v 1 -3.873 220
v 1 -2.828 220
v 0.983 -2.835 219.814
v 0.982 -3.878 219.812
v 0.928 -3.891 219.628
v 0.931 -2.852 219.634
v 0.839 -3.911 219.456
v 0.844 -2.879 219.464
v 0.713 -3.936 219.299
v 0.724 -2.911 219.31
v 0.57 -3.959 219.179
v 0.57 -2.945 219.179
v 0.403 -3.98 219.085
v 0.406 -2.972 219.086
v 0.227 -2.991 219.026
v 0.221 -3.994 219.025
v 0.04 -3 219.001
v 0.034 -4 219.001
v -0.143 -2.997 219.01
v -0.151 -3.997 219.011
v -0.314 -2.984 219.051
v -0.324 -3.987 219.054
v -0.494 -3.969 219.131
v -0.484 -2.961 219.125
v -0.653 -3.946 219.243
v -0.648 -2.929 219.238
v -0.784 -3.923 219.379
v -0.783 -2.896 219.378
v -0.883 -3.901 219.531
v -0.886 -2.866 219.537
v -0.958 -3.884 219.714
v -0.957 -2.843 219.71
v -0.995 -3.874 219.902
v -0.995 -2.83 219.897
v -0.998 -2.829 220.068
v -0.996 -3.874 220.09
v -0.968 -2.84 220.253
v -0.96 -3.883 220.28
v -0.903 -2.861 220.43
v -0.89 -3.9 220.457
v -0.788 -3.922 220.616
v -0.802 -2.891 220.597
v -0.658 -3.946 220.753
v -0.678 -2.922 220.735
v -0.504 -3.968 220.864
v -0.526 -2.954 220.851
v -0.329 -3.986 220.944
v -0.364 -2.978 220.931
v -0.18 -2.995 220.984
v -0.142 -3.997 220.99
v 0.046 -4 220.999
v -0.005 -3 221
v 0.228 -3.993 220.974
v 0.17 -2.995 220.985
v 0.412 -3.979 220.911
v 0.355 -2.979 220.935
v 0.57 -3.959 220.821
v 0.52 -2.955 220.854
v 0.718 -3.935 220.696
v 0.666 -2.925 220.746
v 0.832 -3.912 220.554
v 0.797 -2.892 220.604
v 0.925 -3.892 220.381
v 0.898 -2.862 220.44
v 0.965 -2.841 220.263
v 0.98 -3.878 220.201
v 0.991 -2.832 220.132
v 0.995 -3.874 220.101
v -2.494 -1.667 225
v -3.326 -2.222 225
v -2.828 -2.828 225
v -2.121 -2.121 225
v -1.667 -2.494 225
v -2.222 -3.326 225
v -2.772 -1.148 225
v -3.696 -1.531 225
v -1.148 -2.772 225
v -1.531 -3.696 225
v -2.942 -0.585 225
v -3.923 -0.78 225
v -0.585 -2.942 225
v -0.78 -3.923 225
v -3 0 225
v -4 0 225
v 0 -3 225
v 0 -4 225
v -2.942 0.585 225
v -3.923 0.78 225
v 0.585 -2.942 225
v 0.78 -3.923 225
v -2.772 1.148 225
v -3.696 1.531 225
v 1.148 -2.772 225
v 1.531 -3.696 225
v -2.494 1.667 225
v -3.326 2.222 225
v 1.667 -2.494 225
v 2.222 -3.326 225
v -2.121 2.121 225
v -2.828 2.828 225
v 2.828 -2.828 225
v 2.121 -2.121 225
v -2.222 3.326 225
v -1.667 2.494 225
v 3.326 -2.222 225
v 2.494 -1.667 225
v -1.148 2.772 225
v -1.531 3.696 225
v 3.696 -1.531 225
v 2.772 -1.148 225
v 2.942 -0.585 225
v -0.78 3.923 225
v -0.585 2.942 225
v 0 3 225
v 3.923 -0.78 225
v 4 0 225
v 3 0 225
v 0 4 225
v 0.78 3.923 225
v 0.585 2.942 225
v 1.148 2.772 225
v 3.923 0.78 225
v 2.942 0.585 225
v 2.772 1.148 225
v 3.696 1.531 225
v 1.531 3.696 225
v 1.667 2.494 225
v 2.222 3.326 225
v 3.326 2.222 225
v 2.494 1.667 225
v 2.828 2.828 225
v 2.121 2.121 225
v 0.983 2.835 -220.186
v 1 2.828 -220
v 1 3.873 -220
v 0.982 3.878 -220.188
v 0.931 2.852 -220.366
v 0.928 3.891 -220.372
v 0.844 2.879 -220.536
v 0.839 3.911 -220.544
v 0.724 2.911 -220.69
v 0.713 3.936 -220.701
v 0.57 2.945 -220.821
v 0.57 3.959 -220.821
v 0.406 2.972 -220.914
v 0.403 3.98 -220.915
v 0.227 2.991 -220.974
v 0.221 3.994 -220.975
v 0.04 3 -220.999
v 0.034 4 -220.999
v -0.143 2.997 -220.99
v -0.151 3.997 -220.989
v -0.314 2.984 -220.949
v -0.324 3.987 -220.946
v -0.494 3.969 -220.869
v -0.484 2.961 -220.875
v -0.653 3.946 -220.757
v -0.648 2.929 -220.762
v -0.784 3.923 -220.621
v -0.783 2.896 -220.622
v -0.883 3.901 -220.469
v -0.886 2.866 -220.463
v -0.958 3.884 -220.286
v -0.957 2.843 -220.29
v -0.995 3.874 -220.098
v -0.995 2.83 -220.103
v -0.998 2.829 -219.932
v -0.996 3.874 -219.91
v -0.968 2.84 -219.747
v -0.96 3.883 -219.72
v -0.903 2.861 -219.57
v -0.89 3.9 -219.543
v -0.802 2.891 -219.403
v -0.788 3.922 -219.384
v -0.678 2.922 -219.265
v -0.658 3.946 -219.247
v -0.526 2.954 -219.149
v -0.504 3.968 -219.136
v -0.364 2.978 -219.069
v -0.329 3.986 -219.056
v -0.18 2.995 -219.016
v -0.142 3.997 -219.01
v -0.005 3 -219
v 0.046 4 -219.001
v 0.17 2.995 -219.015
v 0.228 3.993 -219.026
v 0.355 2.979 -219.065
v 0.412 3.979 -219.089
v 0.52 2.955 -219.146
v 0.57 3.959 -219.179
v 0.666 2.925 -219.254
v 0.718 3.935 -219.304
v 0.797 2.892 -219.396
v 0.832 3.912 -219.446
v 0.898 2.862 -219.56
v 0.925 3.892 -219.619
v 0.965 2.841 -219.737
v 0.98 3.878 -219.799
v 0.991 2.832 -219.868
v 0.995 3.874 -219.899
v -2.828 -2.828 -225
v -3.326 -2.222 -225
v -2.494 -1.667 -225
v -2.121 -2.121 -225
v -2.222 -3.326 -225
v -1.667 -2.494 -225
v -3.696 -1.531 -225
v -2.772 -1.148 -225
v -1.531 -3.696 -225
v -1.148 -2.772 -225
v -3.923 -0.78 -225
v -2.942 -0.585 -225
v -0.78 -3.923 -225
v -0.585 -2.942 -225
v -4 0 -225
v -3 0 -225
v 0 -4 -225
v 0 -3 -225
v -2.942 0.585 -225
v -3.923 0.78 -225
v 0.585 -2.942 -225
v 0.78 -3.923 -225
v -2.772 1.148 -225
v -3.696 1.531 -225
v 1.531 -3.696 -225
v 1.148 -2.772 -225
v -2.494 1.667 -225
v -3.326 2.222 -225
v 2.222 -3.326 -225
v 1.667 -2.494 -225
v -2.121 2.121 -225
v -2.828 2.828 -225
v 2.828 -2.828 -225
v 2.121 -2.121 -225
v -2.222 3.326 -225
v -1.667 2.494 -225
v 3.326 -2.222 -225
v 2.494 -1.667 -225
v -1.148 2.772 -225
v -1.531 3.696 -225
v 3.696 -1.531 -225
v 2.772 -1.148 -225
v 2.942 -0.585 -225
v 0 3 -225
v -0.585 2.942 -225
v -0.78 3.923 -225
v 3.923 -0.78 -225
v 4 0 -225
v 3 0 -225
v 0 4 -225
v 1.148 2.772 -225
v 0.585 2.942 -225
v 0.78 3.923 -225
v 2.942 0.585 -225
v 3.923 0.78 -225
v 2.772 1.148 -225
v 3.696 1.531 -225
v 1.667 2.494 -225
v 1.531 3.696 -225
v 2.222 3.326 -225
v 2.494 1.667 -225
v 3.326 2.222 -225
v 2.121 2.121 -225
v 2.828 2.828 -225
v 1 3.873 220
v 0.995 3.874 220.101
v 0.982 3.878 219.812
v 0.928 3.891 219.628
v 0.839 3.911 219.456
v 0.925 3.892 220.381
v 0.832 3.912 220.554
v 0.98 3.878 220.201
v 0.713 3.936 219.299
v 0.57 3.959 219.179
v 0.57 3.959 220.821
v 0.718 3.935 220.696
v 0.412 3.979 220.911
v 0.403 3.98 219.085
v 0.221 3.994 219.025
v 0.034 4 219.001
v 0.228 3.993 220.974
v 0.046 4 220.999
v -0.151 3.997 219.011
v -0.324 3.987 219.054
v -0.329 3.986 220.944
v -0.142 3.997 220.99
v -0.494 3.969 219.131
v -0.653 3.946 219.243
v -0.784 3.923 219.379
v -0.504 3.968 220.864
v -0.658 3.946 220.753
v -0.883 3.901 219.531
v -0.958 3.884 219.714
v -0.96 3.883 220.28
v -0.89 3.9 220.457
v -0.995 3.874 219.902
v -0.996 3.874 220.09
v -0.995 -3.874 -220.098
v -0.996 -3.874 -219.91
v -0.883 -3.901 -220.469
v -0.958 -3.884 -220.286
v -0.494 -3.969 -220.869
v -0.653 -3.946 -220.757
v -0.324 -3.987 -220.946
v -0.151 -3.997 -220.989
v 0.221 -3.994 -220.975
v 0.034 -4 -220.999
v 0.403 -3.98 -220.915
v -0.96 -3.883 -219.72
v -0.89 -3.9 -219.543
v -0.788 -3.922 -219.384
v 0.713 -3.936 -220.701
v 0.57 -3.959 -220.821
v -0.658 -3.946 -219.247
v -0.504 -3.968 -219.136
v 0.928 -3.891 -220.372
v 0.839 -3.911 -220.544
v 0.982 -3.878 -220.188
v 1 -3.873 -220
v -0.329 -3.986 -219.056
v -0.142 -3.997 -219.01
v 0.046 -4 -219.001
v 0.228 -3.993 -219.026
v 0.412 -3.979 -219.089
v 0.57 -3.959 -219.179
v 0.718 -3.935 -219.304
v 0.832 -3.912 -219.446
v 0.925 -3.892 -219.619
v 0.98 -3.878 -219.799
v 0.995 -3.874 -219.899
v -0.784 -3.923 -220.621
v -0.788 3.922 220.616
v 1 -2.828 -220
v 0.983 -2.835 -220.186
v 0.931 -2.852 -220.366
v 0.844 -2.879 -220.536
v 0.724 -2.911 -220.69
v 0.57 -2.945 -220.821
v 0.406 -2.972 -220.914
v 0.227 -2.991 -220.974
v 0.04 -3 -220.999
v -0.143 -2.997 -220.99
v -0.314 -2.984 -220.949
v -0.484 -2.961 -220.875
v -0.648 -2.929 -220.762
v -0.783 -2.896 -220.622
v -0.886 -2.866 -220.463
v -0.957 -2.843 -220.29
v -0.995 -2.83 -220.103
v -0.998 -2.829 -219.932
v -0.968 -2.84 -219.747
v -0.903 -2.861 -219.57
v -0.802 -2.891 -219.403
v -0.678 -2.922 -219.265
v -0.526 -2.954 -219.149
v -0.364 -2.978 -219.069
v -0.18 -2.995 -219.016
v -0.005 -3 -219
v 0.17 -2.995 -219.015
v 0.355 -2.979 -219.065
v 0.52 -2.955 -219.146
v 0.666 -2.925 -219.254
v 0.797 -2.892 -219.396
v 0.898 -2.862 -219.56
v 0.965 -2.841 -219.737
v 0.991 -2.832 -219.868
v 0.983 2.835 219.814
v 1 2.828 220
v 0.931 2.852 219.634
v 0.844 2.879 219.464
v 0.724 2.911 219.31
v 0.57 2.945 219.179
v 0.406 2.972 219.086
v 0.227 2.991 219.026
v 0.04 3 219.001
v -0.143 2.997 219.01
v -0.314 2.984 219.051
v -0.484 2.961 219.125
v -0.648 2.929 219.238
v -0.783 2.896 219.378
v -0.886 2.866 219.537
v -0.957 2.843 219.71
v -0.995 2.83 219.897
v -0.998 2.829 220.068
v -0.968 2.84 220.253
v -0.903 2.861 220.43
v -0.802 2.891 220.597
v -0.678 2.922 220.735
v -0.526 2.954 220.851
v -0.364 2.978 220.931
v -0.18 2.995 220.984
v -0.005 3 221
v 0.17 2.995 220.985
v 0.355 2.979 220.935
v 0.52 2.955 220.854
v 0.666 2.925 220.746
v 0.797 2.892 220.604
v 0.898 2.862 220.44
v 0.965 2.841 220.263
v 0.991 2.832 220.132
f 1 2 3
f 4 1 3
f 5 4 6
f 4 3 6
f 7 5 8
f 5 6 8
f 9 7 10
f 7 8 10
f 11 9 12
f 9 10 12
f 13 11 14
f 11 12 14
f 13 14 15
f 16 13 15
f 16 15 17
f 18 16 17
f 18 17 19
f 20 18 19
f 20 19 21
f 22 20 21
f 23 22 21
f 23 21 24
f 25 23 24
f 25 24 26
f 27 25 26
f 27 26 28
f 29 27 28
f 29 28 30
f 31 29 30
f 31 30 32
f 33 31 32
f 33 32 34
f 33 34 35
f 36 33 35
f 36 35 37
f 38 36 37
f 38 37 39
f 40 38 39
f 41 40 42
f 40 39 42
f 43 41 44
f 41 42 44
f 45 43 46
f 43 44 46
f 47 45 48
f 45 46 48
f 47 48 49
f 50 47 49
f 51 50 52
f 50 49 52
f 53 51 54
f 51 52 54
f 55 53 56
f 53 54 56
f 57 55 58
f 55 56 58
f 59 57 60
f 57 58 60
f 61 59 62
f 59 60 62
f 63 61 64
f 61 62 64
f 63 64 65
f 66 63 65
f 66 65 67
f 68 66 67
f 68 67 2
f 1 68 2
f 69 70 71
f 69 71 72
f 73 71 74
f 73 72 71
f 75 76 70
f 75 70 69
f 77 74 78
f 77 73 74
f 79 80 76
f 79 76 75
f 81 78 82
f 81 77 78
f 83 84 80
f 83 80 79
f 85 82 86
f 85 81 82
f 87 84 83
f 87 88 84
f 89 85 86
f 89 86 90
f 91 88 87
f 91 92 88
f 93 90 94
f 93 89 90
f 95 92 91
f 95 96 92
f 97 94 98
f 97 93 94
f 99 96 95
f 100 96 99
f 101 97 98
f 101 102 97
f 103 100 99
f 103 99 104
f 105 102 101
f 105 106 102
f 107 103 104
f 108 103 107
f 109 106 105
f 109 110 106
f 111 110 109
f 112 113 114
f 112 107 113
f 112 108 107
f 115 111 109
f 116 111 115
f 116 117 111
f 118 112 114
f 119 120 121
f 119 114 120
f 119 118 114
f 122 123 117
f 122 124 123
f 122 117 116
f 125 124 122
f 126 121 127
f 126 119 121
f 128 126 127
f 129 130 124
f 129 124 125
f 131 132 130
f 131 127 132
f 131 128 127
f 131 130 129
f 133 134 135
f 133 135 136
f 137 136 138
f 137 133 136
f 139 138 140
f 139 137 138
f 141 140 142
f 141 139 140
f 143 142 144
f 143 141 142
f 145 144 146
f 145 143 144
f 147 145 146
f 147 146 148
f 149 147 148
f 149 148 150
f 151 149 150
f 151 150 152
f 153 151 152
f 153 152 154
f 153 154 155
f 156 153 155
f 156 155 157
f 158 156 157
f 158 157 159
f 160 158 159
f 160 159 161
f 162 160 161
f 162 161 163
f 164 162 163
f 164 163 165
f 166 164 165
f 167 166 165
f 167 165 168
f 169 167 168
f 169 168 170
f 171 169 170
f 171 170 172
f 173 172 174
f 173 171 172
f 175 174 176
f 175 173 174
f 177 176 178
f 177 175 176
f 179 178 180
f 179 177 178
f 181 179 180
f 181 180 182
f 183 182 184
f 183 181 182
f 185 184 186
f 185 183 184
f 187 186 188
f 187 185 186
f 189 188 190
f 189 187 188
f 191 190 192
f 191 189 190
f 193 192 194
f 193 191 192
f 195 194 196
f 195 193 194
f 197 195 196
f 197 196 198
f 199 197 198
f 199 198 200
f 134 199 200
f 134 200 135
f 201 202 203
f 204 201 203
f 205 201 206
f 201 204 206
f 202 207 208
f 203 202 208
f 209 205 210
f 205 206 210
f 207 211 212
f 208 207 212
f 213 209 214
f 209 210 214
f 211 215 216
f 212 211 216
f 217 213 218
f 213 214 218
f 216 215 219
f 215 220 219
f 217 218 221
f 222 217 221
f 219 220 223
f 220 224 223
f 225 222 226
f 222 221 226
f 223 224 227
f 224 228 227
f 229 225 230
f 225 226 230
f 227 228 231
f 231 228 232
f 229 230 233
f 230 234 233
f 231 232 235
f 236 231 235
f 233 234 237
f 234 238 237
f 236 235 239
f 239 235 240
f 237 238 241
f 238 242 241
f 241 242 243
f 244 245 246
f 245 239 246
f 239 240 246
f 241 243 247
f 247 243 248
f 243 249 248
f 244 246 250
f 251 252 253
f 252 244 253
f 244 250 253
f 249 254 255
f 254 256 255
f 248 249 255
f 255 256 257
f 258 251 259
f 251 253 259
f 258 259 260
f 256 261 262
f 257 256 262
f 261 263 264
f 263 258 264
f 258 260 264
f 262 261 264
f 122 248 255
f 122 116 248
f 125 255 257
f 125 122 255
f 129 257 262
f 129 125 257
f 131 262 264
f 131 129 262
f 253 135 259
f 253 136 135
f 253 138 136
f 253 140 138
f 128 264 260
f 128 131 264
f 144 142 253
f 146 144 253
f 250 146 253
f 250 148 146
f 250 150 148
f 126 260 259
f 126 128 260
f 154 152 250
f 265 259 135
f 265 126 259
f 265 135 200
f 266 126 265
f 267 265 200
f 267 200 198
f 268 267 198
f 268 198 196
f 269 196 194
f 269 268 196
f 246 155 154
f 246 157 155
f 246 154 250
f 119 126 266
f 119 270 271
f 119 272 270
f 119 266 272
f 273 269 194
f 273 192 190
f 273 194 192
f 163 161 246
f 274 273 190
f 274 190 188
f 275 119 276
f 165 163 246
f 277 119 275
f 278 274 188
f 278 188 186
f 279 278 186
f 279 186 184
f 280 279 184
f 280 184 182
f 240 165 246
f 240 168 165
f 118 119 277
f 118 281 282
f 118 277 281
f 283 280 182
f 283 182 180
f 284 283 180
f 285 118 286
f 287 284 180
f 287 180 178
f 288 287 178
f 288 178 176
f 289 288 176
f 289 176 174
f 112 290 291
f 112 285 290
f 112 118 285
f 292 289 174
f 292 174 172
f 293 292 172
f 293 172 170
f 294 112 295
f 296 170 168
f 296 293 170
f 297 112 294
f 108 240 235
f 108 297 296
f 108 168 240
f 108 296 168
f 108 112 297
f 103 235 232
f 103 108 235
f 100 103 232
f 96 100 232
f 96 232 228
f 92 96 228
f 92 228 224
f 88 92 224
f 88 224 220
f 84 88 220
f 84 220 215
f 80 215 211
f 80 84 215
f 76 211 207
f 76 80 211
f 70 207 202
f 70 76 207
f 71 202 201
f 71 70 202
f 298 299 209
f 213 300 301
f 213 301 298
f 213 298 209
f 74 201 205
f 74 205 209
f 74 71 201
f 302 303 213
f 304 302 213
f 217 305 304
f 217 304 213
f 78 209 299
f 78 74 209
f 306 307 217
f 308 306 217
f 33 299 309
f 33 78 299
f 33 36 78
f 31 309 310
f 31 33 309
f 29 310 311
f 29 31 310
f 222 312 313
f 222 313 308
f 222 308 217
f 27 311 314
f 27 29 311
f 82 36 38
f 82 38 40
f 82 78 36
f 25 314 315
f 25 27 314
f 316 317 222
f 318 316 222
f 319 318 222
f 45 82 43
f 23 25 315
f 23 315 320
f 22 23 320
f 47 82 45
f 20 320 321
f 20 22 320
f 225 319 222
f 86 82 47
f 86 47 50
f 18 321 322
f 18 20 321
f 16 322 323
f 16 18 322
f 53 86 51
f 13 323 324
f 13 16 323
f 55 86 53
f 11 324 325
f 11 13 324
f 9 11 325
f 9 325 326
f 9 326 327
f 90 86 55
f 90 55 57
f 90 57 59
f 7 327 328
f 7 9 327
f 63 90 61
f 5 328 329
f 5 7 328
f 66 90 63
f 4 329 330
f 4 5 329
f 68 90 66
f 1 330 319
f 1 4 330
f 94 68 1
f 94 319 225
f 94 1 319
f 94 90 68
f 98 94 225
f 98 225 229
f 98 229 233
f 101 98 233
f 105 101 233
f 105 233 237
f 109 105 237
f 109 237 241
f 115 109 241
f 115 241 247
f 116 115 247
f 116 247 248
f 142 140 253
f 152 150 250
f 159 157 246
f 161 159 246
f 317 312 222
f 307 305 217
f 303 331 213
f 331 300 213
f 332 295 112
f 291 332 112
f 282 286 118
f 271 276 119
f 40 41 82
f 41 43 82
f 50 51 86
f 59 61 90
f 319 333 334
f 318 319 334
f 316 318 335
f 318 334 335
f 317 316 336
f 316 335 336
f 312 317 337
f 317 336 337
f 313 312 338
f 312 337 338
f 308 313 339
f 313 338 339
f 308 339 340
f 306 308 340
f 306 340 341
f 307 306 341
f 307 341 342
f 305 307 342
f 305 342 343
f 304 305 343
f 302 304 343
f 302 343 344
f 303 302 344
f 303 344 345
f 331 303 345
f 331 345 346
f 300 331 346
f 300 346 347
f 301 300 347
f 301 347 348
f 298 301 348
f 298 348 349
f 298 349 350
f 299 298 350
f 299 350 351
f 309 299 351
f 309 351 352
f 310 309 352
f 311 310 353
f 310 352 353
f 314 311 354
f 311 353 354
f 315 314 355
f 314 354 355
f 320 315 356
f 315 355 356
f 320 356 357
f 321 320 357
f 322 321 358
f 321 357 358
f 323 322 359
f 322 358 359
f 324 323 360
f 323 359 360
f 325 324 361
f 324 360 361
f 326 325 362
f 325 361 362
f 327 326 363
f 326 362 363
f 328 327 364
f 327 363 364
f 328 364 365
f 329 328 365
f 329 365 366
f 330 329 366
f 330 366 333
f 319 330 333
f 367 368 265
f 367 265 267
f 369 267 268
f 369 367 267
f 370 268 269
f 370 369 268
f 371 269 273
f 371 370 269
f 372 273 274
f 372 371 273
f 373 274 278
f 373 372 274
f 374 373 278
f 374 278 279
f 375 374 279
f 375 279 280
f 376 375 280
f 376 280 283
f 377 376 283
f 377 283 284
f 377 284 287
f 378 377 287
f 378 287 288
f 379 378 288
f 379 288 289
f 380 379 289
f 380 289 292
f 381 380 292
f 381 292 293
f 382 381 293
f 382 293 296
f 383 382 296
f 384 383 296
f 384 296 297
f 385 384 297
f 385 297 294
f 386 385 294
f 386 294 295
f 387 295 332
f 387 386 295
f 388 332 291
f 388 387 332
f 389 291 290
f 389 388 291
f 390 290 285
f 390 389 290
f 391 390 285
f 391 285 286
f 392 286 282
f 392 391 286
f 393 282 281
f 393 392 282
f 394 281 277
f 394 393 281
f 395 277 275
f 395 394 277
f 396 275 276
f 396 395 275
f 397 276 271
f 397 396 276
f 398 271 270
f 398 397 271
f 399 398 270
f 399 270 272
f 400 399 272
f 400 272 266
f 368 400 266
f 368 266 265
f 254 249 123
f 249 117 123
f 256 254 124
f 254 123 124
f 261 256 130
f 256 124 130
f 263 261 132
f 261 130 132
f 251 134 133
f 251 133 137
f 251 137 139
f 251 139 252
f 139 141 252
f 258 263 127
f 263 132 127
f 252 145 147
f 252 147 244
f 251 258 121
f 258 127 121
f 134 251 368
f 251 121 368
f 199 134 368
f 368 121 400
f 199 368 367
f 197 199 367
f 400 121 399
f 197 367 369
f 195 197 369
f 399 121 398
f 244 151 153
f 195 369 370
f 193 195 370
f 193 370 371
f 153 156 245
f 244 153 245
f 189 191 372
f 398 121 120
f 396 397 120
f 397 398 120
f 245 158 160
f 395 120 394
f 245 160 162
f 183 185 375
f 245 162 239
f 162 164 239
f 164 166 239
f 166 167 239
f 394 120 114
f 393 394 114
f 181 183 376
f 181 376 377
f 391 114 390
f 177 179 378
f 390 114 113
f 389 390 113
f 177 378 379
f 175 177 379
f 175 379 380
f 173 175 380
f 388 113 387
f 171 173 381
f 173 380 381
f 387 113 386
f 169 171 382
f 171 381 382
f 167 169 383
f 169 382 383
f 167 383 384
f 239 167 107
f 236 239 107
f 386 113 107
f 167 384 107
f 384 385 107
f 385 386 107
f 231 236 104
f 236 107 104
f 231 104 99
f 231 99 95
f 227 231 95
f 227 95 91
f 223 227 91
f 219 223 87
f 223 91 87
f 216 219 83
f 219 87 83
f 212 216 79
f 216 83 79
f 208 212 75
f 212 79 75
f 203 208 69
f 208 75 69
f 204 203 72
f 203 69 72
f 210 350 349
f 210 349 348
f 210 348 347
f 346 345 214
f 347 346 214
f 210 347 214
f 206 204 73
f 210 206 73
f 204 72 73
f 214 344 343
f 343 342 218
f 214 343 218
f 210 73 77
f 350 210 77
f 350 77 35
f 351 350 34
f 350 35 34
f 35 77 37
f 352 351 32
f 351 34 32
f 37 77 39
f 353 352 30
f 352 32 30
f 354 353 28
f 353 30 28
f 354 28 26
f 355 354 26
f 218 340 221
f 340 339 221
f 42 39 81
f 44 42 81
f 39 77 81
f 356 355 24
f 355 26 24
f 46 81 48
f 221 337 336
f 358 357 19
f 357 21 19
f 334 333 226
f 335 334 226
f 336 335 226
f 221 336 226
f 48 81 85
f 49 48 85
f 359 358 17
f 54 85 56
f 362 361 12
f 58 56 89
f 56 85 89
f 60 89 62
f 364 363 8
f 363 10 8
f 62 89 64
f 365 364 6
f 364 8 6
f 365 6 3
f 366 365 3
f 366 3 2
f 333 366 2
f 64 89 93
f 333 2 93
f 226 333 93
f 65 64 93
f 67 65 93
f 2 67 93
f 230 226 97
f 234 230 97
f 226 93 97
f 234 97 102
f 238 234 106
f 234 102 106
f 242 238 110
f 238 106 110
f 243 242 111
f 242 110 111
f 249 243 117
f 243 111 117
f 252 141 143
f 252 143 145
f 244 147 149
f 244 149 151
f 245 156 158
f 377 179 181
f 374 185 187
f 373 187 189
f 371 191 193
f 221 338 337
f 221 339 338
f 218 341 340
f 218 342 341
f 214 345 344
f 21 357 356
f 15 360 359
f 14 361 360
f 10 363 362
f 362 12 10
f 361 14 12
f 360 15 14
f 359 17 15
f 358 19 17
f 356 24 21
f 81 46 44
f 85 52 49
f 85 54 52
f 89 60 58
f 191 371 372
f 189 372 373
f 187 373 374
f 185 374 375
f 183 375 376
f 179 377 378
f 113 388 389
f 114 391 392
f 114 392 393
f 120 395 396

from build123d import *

# Parameters (mm, degrees)
SKETCH_1_R               = 4
SKETCH_1_R_2             = 3
EXTRUDE_1_DEPTH          = 225
EXTRUDE_1_DEPTH_BACK     = 225
SKETCH_3_R               = 1
CUT_EXTRUDE_2_DEPTH      = 5
CUT_EXTRUDE_2_DEPTH_BACK = 5


with BuildPart() as part:
    # 草图1 → 凸台-拉伸1 (new body, two sides)
    with BuildSketch(Plane.XY) as extrude_1_sk:
        Circle(SKETCH_1_R)
        Circle(SKETCH_1_R_2, mode=Mode.SUBTRACT)
    extrude(amount=EXTRUDE_1_DEPTH)
    extrude(extrude_1_sk.sketch, amount=-EXTRUDE_1_DEPTH_BACK)

    # 草图3 → 切除-拉伸2 (cut, two sides)
    with BuildSketch(Plane(origin=(0, 0, 0), x_dir=(1, 0, 0), z_dir=(0, 1, 0))) as cut_extrude_2_sk:
        with Locations((0, 220)):
            Circle(SKETCH_3_R)
        with Locations((0, -220)):
            Circle(SKETCH_3_R)
    extrude(amount=CUT_EXTRUDE_2_DEPTH, mode=Mode.SUBTRACT)
    extrude(cut_extrude_2_sk.sketch, amount=-CUT_EXTRUDE_2_DEPTH_BACK, mode=Mode.SUBTRACT)


solid = part.part
